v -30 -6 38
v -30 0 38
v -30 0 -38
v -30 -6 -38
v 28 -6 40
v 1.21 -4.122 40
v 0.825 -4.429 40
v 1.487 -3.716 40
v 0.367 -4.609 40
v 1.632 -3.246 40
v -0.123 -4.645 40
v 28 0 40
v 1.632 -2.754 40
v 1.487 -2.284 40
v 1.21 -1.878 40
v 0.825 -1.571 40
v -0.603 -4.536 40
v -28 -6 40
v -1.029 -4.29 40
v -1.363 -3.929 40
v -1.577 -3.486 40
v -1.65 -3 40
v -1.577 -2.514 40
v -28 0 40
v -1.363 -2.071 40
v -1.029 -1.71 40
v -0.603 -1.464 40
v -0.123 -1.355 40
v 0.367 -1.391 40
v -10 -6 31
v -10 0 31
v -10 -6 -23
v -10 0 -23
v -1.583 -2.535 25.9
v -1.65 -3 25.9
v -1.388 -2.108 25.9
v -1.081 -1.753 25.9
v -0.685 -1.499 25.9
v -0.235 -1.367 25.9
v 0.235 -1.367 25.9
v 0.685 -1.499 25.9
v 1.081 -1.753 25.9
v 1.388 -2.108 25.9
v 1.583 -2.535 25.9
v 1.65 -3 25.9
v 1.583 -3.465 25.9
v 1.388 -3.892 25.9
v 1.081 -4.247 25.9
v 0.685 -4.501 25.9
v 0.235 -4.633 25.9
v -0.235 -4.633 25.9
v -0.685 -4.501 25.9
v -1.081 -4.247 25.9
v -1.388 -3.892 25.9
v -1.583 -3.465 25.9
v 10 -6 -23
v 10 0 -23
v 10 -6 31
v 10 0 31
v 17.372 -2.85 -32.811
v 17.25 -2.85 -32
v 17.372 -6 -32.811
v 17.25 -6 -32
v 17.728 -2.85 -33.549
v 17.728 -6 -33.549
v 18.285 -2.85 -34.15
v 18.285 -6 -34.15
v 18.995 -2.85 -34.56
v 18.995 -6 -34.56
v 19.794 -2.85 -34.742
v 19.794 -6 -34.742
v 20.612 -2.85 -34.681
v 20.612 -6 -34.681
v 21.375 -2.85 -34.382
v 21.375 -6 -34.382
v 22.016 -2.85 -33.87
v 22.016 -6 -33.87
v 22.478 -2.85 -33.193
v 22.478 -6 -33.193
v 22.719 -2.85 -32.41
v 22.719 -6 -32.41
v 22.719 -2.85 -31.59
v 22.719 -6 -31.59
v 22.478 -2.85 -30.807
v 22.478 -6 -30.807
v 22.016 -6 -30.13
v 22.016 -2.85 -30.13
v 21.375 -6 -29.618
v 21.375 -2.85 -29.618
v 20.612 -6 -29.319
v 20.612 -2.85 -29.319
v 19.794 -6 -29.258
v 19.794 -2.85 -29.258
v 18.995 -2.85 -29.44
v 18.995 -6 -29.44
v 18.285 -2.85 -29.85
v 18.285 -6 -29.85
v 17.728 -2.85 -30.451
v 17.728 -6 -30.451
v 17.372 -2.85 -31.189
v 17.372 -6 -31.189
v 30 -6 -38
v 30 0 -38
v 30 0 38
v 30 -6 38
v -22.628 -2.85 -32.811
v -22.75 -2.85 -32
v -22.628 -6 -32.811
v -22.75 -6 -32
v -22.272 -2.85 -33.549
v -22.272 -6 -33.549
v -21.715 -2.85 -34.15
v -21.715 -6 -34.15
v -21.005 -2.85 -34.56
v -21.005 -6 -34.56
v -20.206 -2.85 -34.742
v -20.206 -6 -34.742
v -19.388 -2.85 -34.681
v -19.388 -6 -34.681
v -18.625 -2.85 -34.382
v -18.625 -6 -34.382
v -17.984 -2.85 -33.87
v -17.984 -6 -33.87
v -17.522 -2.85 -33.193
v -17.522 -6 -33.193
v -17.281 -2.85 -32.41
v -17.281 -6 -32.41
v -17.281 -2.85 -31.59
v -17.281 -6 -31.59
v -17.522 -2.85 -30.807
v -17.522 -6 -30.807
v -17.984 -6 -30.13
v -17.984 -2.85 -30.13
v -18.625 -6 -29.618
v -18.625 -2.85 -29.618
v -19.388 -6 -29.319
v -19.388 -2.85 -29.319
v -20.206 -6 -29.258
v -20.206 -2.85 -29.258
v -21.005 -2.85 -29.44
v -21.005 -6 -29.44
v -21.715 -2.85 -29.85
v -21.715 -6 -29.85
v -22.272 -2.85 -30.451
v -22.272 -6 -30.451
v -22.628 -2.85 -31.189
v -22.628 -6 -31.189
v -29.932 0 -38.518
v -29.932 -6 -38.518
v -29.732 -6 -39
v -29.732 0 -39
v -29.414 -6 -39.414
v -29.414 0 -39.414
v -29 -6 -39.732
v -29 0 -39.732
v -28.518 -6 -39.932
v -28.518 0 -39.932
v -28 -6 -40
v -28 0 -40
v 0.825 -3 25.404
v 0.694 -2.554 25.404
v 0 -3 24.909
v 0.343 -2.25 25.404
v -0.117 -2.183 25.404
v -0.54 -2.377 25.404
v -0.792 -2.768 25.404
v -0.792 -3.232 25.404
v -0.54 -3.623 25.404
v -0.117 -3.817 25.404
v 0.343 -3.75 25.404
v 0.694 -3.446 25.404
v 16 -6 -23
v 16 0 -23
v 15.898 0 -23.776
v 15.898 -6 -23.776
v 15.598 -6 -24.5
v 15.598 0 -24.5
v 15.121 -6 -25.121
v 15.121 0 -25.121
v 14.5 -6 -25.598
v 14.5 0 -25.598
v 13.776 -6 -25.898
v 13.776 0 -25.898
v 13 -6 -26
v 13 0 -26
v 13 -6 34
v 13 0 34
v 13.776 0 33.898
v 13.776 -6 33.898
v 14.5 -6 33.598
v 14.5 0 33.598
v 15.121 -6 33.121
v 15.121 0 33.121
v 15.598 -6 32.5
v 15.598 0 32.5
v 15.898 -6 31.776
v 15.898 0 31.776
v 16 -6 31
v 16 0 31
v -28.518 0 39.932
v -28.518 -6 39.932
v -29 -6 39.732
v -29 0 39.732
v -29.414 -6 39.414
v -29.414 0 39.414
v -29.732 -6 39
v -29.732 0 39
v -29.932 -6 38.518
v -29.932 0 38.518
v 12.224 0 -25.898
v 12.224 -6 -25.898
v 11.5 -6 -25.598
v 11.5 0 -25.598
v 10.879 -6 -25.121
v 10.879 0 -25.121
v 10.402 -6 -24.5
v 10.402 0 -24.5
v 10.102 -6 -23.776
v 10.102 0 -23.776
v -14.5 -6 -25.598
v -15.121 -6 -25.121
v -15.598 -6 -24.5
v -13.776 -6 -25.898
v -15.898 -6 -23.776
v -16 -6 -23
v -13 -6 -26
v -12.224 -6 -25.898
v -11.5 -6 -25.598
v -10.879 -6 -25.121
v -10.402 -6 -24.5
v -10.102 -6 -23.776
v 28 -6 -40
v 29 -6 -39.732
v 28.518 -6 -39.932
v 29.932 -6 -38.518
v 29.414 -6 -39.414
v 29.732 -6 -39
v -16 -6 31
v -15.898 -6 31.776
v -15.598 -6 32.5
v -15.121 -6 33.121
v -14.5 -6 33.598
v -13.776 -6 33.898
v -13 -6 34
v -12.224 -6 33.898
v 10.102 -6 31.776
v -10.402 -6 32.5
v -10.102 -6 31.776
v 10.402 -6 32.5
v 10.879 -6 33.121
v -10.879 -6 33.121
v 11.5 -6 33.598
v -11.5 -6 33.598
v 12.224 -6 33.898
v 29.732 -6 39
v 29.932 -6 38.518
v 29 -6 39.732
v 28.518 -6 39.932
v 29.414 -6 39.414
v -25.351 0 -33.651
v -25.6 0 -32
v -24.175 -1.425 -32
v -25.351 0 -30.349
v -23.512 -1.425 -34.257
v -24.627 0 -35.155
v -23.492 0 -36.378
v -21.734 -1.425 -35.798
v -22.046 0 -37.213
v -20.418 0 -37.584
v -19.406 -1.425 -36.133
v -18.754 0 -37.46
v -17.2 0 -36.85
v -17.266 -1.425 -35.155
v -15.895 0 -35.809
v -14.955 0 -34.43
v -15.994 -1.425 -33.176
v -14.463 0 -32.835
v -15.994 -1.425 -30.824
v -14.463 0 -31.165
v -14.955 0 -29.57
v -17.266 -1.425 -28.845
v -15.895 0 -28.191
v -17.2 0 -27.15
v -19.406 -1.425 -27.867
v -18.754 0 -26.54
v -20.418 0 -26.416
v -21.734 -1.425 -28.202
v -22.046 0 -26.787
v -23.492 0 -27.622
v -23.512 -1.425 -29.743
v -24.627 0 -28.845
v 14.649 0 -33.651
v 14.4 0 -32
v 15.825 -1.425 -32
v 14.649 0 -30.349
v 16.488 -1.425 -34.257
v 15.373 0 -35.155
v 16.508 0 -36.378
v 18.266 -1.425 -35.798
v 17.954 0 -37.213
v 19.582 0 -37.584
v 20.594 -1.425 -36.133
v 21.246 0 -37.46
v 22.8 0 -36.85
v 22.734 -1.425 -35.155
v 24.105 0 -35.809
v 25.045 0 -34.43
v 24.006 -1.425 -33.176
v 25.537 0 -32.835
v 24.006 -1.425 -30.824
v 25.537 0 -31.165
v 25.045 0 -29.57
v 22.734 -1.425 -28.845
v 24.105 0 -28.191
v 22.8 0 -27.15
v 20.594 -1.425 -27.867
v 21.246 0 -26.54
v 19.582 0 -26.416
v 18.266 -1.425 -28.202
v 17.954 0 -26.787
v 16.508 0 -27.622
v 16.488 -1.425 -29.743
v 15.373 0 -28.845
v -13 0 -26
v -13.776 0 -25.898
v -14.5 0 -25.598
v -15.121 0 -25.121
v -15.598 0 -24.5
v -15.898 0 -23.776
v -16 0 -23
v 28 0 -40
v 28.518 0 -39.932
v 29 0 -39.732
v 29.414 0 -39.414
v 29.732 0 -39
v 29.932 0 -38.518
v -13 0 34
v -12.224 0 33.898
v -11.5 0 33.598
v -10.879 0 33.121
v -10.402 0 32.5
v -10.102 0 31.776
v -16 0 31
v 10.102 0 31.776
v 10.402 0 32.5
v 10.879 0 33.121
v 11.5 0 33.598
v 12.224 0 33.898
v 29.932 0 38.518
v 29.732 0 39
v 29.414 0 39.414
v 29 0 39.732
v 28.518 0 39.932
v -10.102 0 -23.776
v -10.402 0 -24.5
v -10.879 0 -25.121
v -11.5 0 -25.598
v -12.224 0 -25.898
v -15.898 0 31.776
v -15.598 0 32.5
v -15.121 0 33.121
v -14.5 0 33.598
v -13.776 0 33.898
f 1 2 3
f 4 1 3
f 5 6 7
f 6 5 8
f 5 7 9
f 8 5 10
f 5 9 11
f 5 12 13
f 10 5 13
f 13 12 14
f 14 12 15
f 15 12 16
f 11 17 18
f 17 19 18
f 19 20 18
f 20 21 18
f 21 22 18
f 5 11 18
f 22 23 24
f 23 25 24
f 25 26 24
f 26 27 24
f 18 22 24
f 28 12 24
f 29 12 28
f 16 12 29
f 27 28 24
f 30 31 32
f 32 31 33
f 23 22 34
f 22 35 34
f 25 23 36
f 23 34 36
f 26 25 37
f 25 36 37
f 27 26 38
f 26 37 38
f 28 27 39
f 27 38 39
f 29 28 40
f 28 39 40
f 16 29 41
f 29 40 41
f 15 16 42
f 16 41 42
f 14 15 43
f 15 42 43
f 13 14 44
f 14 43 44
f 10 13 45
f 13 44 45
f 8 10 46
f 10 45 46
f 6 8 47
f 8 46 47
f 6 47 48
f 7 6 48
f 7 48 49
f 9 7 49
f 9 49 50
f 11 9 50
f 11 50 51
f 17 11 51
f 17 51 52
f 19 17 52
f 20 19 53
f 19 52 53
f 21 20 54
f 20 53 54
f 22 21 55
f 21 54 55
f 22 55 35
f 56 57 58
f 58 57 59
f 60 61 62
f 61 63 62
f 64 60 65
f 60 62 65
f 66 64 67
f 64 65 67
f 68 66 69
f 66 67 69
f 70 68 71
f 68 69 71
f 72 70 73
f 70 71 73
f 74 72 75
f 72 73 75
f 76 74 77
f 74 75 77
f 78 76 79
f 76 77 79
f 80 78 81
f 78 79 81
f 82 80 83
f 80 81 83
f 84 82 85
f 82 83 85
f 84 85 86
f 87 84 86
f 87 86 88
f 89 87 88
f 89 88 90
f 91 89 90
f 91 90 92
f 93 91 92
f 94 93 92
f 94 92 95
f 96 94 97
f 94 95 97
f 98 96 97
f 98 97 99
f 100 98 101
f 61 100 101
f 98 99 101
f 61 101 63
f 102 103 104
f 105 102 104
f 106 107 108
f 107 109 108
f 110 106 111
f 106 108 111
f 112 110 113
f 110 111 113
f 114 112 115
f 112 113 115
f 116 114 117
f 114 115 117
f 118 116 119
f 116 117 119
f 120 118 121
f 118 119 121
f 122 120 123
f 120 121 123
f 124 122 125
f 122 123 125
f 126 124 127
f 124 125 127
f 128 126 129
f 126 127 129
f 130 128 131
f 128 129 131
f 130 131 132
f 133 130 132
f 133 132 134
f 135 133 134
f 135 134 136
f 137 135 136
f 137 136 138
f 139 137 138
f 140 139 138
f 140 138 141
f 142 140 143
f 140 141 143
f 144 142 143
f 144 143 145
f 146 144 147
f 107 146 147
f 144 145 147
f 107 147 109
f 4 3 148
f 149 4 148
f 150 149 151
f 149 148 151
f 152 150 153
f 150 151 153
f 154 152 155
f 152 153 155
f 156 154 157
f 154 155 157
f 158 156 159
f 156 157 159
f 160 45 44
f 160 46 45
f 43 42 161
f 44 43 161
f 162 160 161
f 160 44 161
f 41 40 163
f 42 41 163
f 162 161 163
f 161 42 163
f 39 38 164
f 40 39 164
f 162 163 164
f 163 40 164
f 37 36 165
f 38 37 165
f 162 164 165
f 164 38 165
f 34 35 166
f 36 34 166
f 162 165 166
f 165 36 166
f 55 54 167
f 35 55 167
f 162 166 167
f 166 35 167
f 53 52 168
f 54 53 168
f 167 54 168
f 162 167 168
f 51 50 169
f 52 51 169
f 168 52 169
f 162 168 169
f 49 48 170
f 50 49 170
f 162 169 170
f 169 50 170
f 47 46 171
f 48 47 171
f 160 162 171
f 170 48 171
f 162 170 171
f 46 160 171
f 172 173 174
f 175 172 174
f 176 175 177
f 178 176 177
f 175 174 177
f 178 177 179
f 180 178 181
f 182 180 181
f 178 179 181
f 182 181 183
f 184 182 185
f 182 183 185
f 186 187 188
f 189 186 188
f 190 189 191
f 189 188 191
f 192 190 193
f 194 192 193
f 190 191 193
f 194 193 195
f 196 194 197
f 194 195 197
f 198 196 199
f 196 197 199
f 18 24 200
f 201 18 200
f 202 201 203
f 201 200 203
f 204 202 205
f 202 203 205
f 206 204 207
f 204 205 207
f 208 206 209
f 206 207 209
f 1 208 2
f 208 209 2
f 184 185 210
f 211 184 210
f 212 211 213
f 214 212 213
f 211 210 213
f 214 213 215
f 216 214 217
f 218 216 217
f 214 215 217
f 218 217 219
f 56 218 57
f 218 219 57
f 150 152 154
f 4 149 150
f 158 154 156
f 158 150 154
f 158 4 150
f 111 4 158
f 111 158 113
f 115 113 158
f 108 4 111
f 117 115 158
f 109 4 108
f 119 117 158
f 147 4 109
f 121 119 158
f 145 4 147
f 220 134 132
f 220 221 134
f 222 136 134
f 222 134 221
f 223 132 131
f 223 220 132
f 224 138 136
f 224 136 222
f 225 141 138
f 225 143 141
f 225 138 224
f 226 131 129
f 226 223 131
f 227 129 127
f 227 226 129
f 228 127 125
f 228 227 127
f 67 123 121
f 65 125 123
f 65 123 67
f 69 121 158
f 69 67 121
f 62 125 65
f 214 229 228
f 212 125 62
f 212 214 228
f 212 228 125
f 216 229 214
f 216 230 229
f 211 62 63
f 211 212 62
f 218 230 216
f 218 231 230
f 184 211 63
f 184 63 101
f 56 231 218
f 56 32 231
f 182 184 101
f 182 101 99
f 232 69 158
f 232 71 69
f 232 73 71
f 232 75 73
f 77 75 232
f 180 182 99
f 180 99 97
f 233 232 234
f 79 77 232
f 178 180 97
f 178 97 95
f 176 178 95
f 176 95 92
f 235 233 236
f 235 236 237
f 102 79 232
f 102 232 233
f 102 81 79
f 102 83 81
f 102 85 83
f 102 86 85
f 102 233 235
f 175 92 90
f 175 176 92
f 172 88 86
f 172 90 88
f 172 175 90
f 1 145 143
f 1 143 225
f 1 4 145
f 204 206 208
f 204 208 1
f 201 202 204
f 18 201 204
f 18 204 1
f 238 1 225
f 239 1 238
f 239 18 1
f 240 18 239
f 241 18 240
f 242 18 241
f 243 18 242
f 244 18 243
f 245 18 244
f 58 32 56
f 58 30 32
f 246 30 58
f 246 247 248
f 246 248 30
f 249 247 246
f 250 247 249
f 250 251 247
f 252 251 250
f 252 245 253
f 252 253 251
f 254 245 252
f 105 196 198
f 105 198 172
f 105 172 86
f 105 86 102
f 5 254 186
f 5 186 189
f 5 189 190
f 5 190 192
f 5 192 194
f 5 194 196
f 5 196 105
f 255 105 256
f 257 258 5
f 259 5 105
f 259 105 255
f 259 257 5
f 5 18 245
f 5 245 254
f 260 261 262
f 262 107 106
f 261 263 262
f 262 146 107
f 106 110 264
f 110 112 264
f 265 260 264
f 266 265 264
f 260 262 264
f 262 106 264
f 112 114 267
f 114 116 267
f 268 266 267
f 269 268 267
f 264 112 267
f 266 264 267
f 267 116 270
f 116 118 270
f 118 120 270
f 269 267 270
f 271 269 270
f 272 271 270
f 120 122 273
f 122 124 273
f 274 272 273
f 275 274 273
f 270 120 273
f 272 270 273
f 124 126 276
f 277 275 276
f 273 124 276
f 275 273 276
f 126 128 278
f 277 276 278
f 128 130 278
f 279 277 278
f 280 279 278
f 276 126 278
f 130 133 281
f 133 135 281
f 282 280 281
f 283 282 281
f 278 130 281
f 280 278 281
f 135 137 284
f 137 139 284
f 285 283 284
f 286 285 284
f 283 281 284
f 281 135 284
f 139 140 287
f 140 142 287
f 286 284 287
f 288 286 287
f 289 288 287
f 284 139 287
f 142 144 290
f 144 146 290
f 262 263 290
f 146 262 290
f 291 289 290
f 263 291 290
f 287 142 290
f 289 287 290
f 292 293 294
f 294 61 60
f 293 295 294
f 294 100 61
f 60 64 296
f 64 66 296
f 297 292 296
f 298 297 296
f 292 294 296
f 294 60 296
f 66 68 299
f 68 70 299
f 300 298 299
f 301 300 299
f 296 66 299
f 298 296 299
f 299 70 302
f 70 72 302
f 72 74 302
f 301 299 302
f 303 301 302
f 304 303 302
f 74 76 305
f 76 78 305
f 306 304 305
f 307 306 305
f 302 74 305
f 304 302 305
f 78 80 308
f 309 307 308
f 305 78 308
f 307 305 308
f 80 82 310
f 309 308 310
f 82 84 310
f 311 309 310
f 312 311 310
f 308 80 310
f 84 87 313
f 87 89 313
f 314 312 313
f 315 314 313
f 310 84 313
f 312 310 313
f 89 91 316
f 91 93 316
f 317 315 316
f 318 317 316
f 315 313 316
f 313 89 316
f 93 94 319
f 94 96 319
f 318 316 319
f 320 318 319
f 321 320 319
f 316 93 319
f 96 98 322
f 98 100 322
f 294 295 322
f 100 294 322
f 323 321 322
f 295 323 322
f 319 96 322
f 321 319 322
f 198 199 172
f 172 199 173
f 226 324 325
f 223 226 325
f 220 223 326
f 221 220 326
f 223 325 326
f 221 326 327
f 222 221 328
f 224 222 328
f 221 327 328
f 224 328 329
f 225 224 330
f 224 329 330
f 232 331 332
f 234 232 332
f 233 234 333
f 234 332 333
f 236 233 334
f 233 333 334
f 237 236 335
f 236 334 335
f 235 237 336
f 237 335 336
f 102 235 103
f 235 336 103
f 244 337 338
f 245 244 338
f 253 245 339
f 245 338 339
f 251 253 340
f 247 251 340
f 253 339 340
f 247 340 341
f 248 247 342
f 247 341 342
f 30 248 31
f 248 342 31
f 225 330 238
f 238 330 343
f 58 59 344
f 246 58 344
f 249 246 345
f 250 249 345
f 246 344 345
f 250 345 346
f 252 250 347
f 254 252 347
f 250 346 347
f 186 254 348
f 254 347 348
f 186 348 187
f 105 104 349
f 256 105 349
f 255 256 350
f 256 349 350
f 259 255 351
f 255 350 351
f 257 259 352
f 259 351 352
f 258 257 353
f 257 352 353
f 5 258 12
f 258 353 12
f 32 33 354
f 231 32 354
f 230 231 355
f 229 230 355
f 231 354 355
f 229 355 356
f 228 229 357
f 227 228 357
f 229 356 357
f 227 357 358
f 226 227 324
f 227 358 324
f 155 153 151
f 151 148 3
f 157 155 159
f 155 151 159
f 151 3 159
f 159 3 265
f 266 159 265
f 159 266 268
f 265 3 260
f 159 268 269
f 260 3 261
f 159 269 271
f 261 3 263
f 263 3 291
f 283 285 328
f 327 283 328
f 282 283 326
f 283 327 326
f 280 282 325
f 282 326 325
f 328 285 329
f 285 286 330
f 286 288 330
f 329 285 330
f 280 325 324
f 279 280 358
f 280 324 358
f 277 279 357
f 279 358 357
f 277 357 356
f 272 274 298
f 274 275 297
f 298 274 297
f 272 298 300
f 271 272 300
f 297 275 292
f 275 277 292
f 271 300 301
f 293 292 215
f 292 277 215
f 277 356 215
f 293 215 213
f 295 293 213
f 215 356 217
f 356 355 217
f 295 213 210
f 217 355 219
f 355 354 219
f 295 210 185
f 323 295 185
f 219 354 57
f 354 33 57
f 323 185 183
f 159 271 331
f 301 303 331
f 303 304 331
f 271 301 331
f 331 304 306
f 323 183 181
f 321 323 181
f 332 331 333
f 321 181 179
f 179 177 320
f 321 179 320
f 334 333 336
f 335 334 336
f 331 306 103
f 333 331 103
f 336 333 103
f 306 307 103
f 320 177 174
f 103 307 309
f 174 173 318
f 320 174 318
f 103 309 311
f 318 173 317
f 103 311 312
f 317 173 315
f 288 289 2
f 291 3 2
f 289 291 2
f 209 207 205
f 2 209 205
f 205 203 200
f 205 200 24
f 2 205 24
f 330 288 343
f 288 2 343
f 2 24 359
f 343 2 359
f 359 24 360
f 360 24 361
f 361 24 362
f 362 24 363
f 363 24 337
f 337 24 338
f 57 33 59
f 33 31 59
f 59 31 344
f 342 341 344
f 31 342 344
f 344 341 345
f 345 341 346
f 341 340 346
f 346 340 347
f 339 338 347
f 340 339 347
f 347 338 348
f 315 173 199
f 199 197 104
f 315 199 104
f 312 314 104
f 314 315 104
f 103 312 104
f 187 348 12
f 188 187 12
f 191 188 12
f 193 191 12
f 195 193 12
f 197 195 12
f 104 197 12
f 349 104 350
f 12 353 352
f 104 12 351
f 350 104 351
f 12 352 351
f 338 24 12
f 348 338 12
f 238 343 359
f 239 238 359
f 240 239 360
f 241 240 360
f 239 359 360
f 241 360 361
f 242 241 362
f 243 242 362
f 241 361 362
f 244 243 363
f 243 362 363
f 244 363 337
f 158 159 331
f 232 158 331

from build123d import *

# Parameters (mm, degrees)
F1_DEPTH       = 6
F2_D           = 5.5
F2_DEPTH       = 19
F2_CSINK_D     = 11.2
F2_CSINK_ANGLE = 90
F2_TIP         = 1.6523667023
F4_D           = 3.3
F4_DEPTH       = 14.1
F4_TIP         = 0.9914200214


with BuildPart() as f1:
    # F0 (on Front) → F1 (new body)
    with BuildSketch(Plane.XZ):
        with BuildLine():
            Line((28, 40), (-28, 40))
            ThreePointArc((-28, 40), (-29.4142135624, 39.4142135624), (-30, 38))
            Line((-30, 38), (-30, -38))
            ThreePointArc((-30, -38), (-29.4142135624, -39.4142135624), (-28, -40))
            Line((-28, -40), (28, -40))
            ThreePointArc((28, -40), (29.4142135624, -39.4142135624), (30, -38))
            Line((30, -38), (30, 38))
            ThreePointArc((30, 38), (29.4142135624, 39.4142135624), (28, 40))
        make_face()
        with BuildLine():
            Line((-16, -23), (-16, 31))
            ThreePointArc((-16, 31), (-15.1213203436, 33.1213203436), (-13, 34))
            ThreePointArc((-13, 34), (-10.8786796564, 33.1213203436), (-10, 31))
            Line((-10, 31), (-10, -23))
            ThreePointArc((-10, -23), (-10.8786796564, -25.1213203436), (-13, -26))
            ThreePointArc((-13, -26), (-15.1213203436, -25.1213203436), (-16, -23))
        make_face(mode=Mode.SUBTRACT)
        with BuildLine():
            Line((10, -23), (10, 31))
            ThreePointArc((10, 31), (10.8786796564, 33.1213203436), (13, 34))
            ThreePointArc((13, 34), (15.1213203436, 33.1213203436), (16, 31))
            Line((16, 31), (16, -23))
            ThreePointArc((16, -23), (15.1213203436, -25.1213203436), (13, -26))
            ThreePointArc((13, -26), (10.8786796564, -25.1213203436), (10, -23))
        make_face(mode=Mode.SUBTRACT)
    extrude(amount=F1_DEPTH)

    # F2
    with Locations(Plane(origin=(0, 0, 0), x_dir=(1, 0, 0), z_dir=(0, 1, 0))):
        with Locations((-20, 32), (20, 32)):
            CounterSinkHole(F2_D / 2, F2_CSINK_D / 2, depth=F2_DEPTH, counter_sink_angle=F2_CSINK_ANGLE)
            with Locations((0, 0, -(F2_DEPTH + F2_TIP / 2))):  # 118° drill point
                Cone(0, F2_D / 2, F2_TIP, mode=Mode.SUBTRACT)

    # F4
    with Locations(Plane.XY.offset(40)):
        with Locations((0, -3)):
            Hole(F4_D / 2, depth=F4_DEPTH)
            with Locations((0, 0, -(F4_DEPTH + F4_TIP / 2))):  # 118° drill point
                Cone(0, F4_D / 2, F4_TIP, mode=Mode.SUBTRACT)


solid = f1.part
